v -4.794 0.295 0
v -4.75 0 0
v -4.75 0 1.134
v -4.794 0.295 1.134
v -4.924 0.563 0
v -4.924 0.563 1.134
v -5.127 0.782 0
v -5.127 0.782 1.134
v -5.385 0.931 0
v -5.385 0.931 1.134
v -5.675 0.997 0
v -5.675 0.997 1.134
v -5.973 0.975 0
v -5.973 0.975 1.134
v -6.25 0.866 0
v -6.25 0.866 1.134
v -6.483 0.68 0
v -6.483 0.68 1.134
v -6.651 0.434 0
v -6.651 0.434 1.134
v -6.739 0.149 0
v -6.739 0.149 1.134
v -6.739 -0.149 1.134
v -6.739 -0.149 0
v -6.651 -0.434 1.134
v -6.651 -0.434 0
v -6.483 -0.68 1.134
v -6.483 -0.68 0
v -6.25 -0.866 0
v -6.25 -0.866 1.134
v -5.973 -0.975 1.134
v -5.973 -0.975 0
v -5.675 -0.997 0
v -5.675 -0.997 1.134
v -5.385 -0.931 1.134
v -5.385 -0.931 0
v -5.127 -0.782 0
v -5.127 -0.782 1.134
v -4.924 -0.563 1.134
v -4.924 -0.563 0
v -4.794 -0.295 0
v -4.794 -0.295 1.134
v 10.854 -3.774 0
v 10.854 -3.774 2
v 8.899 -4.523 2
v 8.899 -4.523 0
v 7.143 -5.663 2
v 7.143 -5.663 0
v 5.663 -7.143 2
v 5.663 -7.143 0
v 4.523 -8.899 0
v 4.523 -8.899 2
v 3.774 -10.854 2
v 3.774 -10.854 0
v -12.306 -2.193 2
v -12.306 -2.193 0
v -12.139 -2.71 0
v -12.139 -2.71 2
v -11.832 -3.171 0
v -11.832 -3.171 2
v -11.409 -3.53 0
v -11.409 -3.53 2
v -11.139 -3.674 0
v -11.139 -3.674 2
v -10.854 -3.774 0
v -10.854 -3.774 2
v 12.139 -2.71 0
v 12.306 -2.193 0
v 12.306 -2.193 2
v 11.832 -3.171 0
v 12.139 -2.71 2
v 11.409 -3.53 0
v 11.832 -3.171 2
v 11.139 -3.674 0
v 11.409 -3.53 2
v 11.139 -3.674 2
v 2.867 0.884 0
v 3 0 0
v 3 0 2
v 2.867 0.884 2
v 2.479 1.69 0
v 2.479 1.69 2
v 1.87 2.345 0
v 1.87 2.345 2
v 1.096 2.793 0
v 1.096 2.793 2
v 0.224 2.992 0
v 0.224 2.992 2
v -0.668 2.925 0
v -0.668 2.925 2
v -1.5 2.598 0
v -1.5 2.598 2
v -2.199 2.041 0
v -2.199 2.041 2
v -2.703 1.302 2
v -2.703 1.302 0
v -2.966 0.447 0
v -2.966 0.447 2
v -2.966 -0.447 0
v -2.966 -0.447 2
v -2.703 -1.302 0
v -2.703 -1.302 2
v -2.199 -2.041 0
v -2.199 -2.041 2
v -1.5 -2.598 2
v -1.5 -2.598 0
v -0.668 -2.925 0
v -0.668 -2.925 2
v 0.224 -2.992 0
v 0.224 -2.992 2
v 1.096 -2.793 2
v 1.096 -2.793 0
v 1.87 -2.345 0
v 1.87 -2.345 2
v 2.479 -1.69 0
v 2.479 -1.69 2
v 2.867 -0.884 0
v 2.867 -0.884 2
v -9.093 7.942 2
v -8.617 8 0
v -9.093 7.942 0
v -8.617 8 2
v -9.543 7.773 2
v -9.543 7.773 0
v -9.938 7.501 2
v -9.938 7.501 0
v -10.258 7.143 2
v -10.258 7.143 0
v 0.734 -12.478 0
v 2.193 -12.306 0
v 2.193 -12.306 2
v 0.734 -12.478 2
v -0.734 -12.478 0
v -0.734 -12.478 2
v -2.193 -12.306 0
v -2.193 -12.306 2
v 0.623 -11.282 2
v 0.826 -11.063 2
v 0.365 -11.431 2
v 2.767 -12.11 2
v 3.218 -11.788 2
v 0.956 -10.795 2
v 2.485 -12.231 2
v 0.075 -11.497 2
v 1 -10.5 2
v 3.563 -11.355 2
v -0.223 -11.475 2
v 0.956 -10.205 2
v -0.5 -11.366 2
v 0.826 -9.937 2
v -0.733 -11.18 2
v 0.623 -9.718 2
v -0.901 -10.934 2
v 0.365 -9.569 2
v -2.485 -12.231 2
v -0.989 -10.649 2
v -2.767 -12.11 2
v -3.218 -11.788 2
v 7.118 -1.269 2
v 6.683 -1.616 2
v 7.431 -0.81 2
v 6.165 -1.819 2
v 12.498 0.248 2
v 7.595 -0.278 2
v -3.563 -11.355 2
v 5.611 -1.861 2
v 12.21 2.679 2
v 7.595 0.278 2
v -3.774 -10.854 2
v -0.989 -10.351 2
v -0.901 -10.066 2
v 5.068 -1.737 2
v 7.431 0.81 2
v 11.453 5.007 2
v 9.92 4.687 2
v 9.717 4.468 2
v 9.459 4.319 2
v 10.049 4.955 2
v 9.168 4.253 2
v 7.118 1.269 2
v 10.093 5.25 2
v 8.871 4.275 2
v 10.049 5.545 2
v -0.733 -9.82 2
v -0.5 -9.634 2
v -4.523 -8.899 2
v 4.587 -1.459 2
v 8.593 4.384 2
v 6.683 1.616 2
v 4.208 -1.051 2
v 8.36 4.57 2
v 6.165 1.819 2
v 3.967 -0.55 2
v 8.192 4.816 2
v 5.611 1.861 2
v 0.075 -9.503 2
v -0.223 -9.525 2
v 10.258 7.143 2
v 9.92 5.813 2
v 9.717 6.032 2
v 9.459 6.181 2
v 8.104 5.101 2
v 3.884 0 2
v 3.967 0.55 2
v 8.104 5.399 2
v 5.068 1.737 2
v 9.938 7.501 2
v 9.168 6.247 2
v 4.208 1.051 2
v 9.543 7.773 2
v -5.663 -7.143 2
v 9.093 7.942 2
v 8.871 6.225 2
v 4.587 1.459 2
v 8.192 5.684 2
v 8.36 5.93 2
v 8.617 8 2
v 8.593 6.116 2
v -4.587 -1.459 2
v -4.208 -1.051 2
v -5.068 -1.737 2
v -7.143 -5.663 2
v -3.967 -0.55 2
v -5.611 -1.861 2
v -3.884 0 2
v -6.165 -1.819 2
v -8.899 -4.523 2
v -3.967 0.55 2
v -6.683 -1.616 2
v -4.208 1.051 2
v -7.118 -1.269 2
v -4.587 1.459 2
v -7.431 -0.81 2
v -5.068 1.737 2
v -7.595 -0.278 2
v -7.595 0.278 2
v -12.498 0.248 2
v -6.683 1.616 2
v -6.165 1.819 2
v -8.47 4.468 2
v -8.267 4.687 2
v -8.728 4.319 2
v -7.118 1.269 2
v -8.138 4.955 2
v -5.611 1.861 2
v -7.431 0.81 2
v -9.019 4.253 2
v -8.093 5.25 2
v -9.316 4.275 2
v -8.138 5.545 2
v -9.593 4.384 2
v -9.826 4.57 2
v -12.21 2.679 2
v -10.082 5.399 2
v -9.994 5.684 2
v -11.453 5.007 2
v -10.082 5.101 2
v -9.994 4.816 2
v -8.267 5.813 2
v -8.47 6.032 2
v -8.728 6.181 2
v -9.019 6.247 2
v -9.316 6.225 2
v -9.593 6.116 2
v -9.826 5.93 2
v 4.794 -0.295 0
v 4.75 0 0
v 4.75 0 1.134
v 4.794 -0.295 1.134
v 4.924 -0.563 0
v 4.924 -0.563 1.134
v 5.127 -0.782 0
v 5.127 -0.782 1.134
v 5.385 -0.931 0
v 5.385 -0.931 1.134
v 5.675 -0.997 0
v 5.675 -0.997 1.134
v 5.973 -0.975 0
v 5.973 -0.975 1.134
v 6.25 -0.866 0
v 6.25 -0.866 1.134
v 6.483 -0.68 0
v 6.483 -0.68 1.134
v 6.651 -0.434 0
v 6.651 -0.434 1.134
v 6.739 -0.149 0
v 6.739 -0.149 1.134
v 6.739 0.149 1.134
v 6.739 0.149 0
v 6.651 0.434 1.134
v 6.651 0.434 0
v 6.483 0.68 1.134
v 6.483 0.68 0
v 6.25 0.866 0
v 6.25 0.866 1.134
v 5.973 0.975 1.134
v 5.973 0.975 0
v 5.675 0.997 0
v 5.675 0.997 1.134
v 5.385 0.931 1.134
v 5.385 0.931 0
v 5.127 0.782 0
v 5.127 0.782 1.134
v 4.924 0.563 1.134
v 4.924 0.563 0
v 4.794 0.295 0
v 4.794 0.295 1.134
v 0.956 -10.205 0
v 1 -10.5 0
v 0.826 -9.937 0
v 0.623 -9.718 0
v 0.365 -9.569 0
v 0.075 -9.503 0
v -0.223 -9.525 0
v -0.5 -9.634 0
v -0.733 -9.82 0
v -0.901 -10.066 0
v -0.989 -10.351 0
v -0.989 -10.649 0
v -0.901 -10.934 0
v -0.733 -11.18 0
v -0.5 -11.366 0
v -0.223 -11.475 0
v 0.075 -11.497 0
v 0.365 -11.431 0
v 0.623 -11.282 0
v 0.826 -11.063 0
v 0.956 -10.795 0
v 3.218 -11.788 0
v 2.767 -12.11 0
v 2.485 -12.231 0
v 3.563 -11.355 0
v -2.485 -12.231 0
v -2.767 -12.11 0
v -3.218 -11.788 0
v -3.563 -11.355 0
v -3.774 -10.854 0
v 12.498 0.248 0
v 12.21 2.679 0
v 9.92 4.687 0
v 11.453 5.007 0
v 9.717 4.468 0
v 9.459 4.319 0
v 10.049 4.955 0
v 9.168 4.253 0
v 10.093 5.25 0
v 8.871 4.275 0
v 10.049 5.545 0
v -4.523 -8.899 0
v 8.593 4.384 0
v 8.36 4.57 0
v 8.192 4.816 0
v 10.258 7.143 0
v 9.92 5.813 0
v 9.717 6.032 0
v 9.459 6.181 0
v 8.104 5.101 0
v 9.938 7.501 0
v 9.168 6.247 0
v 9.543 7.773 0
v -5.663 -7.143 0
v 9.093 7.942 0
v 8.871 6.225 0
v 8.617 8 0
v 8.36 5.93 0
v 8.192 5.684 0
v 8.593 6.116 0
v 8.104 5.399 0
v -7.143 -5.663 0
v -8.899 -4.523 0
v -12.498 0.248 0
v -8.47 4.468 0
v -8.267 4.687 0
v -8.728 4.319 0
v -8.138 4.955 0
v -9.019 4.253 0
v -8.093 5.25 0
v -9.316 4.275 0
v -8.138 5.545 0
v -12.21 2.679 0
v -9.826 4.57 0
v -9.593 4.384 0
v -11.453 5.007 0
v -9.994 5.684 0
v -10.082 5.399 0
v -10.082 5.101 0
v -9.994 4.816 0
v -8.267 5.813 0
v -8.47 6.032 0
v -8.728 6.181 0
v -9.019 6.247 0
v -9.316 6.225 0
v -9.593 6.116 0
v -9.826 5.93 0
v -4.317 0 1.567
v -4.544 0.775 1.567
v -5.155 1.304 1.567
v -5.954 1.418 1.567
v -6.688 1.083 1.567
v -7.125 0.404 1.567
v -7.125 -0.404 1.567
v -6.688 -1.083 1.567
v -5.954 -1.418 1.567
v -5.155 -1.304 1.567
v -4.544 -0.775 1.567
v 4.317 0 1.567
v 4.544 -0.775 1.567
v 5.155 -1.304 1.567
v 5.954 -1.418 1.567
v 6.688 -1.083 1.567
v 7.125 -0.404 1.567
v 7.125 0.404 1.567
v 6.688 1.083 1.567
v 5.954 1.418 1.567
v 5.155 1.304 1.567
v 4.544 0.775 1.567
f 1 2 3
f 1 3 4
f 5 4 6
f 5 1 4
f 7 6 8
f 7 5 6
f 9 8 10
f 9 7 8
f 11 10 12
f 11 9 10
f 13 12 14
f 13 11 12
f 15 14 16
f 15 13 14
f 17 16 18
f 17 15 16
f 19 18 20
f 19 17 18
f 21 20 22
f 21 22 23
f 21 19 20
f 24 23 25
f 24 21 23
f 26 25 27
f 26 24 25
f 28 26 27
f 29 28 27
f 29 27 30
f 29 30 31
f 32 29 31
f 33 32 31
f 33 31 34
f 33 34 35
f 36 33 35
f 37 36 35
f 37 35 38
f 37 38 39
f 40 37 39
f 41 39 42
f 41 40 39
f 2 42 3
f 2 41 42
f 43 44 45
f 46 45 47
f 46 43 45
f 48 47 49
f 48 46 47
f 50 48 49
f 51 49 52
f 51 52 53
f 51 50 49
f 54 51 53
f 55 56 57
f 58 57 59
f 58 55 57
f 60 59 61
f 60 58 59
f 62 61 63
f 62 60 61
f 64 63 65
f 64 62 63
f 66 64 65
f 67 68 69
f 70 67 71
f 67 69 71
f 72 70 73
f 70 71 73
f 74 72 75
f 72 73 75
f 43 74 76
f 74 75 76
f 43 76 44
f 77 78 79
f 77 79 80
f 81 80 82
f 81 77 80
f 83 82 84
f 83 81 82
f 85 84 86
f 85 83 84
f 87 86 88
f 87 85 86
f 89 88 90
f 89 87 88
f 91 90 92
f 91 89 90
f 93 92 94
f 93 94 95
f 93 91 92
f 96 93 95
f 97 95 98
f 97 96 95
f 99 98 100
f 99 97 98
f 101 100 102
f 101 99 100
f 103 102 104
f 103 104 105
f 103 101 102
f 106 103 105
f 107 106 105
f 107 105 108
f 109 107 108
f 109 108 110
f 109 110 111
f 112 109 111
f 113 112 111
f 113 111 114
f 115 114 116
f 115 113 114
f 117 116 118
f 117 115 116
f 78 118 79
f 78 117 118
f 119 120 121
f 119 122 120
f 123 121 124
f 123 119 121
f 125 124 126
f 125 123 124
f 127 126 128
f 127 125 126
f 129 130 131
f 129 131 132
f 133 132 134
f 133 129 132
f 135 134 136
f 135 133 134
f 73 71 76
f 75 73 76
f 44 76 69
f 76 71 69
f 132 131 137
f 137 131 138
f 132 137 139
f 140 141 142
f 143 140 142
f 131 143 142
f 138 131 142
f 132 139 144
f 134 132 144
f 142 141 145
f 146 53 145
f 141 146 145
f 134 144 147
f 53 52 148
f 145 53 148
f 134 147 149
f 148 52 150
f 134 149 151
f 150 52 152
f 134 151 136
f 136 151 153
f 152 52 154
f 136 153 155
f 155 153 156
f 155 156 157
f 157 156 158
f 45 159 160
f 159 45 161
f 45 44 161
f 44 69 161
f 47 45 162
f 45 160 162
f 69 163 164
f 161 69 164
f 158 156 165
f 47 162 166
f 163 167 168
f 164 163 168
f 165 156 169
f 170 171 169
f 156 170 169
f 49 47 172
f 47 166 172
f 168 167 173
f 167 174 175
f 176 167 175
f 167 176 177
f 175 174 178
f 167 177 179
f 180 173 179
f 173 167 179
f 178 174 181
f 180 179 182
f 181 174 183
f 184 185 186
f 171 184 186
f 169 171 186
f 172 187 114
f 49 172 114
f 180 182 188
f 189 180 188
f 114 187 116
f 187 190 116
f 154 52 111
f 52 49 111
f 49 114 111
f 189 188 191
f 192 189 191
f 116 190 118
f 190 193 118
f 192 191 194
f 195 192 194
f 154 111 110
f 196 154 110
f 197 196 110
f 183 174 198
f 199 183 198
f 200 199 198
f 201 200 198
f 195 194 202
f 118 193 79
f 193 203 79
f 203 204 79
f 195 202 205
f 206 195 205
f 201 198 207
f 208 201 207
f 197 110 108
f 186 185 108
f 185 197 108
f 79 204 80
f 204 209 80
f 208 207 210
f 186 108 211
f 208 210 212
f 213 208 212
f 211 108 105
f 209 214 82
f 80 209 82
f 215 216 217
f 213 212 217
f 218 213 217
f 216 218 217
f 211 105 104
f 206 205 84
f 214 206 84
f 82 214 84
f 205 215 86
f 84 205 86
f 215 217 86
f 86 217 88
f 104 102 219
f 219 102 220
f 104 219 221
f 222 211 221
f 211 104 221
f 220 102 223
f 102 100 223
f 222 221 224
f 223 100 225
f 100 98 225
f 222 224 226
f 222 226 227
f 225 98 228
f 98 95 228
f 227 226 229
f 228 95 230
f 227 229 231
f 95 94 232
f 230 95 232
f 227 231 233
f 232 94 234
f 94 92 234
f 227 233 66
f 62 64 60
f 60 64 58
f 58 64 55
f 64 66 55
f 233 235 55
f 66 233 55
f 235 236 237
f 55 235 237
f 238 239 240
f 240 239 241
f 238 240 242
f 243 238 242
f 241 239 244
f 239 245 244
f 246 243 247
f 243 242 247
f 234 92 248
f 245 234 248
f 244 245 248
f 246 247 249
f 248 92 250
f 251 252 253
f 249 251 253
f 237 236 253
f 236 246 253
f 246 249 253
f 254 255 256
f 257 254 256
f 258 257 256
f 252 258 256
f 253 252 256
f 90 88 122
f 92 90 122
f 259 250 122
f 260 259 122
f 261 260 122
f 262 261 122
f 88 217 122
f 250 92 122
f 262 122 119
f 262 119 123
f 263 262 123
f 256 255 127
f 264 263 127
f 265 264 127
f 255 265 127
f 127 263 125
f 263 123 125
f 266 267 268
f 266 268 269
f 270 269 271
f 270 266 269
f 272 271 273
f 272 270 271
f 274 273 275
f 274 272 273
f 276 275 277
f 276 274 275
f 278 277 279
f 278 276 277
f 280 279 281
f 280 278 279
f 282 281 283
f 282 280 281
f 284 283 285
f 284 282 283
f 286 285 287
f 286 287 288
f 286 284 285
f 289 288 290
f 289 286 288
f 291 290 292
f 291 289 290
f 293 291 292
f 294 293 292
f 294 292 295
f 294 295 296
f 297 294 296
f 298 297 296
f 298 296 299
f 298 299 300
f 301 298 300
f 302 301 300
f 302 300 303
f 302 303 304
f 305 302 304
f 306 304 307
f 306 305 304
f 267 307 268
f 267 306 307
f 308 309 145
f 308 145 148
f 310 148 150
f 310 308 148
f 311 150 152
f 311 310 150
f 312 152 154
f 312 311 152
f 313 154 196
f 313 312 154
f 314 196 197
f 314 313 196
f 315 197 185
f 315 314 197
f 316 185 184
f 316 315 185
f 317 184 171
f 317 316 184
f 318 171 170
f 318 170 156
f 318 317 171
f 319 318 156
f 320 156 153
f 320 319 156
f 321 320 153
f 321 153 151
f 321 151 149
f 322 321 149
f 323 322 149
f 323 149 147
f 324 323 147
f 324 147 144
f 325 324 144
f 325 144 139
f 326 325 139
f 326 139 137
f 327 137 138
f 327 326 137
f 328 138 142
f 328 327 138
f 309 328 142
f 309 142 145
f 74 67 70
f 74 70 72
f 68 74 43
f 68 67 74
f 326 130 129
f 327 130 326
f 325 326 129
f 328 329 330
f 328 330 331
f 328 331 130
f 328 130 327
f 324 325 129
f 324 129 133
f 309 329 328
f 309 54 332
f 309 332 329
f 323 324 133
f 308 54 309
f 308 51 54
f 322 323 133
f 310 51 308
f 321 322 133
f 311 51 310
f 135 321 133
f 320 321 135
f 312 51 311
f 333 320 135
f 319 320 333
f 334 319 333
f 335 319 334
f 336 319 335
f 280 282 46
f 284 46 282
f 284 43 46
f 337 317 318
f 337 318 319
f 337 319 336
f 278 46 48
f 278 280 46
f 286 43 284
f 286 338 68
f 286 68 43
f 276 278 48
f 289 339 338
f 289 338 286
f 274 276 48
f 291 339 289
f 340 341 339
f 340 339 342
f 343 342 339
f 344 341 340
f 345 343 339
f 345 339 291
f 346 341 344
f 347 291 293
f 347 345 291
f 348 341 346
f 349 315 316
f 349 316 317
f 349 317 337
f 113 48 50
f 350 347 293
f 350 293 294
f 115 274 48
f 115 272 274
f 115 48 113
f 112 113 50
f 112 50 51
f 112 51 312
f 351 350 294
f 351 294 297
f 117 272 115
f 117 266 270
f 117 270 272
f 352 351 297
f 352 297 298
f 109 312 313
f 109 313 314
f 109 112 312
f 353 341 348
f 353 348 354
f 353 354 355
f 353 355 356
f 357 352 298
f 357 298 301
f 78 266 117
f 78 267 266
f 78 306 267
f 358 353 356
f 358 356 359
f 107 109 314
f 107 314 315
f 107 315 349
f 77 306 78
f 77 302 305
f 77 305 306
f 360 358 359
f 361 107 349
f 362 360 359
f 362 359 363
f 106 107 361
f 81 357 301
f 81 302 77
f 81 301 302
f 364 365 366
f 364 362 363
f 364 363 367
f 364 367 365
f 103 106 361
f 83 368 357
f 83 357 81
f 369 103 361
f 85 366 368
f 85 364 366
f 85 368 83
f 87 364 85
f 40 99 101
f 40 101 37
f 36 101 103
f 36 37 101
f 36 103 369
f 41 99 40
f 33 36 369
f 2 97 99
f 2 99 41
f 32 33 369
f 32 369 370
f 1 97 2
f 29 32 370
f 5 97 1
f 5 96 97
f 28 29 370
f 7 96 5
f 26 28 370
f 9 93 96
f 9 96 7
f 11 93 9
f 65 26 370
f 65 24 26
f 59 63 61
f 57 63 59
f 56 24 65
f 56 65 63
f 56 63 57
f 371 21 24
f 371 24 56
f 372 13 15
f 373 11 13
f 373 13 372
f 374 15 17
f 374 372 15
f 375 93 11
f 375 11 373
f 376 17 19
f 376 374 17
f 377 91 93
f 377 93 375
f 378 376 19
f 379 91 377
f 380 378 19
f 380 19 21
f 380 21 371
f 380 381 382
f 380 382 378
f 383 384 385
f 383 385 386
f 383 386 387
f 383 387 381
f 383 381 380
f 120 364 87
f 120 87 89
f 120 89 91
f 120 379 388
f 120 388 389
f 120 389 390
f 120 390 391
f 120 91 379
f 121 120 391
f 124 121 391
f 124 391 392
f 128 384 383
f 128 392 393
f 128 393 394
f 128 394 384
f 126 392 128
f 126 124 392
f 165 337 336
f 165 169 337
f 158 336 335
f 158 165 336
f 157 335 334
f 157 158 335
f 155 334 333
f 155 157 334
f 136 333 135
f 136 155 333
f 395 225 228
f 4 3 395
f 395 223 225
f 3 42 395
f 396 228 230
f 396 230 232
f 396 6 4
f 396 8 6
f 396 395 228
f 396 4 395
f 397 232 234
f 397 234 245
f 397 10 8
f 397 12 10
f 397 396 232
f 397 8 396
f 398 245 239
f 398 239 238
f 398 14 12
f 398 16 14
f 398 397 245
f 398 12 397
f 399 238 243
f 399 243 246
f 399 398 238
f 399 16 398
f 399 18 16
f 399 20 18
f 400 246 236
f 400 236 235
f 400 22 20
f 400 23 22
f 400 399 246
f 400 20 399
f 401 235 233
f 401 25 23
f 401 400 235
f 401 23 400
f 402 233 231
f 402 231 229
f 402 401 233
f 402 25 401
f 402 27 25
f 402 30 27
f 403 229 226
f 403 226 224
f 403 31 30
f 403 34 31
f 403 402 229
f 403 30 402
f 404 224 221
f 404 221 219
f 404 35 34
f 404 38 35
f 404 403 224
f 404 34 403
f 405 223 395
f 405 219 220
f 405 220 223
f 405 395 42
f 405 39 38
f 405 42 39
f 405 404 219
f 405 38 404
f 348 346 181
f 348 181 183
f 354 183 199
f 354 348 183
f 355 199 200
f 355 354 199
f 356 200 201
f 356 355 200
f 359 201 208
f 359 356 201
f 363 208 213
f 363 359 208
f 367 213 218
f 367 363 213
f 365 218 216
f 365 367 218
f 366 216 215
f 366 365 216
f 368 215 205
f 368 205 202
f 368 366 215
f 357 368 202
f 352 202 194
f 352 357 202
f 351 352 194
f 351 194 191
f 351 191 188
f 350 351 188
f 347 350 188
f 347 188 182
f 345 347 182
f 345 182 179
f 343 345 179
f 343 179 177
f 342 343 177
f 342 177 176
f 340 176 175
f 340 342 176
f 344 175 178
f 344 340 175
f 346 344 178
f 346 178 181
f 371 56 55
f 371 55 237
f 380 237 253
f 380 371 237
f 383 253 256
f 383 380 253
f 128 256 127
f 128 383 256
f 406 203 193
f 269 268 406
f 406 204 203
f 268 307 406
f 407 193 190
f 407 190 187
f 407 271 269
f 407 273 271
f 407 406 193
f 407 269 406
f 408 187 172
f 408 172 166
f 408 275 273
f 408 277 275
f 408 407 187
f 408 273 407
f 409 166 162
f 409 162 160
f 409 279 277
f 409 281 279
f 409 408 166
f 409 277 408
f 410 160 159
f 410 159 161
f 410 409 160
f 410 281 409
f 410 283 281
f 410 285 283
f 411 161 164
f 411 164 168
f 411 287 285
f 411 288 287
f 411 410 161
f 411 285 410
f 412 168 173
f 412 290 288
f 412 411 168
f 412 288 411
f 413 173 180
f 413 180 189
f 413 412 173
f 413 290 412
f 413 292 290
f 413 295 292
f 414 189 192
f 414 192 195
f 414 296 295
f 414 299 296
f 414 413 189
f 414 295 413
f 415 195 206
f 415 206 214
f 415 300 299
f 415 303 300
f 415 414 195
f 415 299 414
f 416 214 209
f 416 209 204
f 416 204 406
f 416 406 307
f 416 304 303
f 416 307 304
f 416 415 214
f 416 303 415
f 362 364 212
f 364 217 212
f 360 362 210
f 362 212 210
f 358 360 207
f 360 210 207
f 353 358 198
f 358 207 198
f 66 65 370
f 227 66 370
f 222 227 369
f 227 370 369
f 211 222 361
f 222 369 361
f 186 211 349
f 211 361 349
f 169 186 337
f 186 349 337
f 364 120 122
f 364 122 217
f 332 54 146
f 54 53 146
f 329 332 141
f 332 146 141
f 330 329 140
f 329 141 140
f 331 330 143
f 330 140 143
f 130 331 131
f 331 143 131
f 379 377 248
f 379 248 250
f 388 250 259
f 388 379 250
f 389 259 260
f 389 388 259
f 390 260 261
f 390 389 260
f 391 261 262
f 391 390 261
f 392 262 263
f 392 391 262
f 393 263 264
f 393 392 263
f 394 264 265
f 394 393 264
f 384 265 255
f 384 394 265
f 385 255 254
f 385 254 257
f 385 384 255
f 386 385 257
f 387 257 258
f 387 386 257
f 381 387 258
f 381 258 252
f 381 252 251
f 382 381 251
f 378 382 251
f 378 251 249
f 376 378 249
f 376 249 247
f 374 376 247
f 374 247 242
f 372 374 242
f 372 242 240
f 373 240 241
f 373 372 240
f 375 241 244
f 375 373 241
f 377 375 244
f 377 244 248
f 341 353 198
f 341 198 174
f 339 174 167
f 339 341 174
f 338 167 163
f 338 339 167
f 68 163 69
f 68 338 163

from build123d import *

# Parameters (mm, degrees)
SKETCH_1_R          = 1
SKETCH_1_R_2        = 3
EXTRUDE_1_DEPTH     = 2
CUT_EXTRUDE_START   = -10
CUT_EXTRUDE_1_DEPTH = 10
FILLET_1_R          = 2
CHAMFER_1_SIZE      = 0.866


with BuildPart() as part:
    # 草图1 → 凸台-拉伸1 (new body)
    with BuildSketch(Plane.XY):
        with BuildLine():
            Line((-9.604686356, 8), (9.604686356, 8))
            ThreePointArc((9.604686356, 8), (0, -12.5), (-9.604686356, 8))
        make_face()
        with Locations((0, -10.5)):
            Circle(SKETCH_1_R, mode=Mode.SUBTRACT)
        with Locations((-9.09326674, 5.25)):
            Circle(SKETCH_1_R, mode=Mode.SUBTRACT)
        with Locations((9.09326674, 5.25)):
            Circle(SKETCH_1_R, mode=Mode.SUBTRACT)
        with Locations((-5.75, 0)):
            Circle(SKETCH_1_R, mode=Mode.SUBTRACT)
        with Locations(Location((5.75, 0, 0), (0, 0, 180))):
            Circle(SKETCH_1_R, mode=Mode.SUBTRACT)
        Circle(SKETCH_1_R_2, mode=Mode.SUBTRACT)
    extrude(amount=EXTRUDE_1_DEPTH)

    # 草图2 → 切除-拉伸1 (cut)
    with BuildSketch(Plane.XY.offset(2).offset(CUT_EXTRUDE_START)):
        with BuildLine():
            ThreePointArc((-11.98818711, -3.540249967), (-6.363961031, -6.363961031), (-3.540249967, -11.98818711))
            ThreePointArc((-3.540249967, -11.98818711), (-8.838834765, -8.838834765), (-11.98818711, -3.540249967))
        make_face()
        with BuildLine():
            ThreePointArc((11.98818711, -3.540249967), (6.363961031, -6.363961031), (3.540249967, -11.98818711))
            ThreePointArc((3.540249967, -11.98818711), (8.838834765, -8.838834765), (11.98818711, -3.540249967))
        make_face()
    extrude(amount=CUT_EXTRUDE_1_DEPTH, mode=Mode.SUBTRACT)

    # 圆角1
    fillet_1_edges = [part.edges().sort_by_distance(p)[0] for p in [
        (-3.540249967, -11.98818711, 1),
        (-11.98818711, -3.540249967, 1),
        (-9.604686356, 8, 1),
        (11.98818711, -3.540249967, 1),
        (9.604686356, 8, 1),
        (3.540249967, -11.98818711, 1),
    ]]
    fillet(fillet_1_edges, radius=FILLET_1_R)

    # 倒角1
    chamfer_1_edges = [part.edges().sort_by_distance(p)[0] for p in [
        (-6.75, 0, 2),
        (6.75, 0, 2),
    ]]
    chamfer(chamfer_1_edges, length=CHAMFER_1_SIZE)


solid = part.part
